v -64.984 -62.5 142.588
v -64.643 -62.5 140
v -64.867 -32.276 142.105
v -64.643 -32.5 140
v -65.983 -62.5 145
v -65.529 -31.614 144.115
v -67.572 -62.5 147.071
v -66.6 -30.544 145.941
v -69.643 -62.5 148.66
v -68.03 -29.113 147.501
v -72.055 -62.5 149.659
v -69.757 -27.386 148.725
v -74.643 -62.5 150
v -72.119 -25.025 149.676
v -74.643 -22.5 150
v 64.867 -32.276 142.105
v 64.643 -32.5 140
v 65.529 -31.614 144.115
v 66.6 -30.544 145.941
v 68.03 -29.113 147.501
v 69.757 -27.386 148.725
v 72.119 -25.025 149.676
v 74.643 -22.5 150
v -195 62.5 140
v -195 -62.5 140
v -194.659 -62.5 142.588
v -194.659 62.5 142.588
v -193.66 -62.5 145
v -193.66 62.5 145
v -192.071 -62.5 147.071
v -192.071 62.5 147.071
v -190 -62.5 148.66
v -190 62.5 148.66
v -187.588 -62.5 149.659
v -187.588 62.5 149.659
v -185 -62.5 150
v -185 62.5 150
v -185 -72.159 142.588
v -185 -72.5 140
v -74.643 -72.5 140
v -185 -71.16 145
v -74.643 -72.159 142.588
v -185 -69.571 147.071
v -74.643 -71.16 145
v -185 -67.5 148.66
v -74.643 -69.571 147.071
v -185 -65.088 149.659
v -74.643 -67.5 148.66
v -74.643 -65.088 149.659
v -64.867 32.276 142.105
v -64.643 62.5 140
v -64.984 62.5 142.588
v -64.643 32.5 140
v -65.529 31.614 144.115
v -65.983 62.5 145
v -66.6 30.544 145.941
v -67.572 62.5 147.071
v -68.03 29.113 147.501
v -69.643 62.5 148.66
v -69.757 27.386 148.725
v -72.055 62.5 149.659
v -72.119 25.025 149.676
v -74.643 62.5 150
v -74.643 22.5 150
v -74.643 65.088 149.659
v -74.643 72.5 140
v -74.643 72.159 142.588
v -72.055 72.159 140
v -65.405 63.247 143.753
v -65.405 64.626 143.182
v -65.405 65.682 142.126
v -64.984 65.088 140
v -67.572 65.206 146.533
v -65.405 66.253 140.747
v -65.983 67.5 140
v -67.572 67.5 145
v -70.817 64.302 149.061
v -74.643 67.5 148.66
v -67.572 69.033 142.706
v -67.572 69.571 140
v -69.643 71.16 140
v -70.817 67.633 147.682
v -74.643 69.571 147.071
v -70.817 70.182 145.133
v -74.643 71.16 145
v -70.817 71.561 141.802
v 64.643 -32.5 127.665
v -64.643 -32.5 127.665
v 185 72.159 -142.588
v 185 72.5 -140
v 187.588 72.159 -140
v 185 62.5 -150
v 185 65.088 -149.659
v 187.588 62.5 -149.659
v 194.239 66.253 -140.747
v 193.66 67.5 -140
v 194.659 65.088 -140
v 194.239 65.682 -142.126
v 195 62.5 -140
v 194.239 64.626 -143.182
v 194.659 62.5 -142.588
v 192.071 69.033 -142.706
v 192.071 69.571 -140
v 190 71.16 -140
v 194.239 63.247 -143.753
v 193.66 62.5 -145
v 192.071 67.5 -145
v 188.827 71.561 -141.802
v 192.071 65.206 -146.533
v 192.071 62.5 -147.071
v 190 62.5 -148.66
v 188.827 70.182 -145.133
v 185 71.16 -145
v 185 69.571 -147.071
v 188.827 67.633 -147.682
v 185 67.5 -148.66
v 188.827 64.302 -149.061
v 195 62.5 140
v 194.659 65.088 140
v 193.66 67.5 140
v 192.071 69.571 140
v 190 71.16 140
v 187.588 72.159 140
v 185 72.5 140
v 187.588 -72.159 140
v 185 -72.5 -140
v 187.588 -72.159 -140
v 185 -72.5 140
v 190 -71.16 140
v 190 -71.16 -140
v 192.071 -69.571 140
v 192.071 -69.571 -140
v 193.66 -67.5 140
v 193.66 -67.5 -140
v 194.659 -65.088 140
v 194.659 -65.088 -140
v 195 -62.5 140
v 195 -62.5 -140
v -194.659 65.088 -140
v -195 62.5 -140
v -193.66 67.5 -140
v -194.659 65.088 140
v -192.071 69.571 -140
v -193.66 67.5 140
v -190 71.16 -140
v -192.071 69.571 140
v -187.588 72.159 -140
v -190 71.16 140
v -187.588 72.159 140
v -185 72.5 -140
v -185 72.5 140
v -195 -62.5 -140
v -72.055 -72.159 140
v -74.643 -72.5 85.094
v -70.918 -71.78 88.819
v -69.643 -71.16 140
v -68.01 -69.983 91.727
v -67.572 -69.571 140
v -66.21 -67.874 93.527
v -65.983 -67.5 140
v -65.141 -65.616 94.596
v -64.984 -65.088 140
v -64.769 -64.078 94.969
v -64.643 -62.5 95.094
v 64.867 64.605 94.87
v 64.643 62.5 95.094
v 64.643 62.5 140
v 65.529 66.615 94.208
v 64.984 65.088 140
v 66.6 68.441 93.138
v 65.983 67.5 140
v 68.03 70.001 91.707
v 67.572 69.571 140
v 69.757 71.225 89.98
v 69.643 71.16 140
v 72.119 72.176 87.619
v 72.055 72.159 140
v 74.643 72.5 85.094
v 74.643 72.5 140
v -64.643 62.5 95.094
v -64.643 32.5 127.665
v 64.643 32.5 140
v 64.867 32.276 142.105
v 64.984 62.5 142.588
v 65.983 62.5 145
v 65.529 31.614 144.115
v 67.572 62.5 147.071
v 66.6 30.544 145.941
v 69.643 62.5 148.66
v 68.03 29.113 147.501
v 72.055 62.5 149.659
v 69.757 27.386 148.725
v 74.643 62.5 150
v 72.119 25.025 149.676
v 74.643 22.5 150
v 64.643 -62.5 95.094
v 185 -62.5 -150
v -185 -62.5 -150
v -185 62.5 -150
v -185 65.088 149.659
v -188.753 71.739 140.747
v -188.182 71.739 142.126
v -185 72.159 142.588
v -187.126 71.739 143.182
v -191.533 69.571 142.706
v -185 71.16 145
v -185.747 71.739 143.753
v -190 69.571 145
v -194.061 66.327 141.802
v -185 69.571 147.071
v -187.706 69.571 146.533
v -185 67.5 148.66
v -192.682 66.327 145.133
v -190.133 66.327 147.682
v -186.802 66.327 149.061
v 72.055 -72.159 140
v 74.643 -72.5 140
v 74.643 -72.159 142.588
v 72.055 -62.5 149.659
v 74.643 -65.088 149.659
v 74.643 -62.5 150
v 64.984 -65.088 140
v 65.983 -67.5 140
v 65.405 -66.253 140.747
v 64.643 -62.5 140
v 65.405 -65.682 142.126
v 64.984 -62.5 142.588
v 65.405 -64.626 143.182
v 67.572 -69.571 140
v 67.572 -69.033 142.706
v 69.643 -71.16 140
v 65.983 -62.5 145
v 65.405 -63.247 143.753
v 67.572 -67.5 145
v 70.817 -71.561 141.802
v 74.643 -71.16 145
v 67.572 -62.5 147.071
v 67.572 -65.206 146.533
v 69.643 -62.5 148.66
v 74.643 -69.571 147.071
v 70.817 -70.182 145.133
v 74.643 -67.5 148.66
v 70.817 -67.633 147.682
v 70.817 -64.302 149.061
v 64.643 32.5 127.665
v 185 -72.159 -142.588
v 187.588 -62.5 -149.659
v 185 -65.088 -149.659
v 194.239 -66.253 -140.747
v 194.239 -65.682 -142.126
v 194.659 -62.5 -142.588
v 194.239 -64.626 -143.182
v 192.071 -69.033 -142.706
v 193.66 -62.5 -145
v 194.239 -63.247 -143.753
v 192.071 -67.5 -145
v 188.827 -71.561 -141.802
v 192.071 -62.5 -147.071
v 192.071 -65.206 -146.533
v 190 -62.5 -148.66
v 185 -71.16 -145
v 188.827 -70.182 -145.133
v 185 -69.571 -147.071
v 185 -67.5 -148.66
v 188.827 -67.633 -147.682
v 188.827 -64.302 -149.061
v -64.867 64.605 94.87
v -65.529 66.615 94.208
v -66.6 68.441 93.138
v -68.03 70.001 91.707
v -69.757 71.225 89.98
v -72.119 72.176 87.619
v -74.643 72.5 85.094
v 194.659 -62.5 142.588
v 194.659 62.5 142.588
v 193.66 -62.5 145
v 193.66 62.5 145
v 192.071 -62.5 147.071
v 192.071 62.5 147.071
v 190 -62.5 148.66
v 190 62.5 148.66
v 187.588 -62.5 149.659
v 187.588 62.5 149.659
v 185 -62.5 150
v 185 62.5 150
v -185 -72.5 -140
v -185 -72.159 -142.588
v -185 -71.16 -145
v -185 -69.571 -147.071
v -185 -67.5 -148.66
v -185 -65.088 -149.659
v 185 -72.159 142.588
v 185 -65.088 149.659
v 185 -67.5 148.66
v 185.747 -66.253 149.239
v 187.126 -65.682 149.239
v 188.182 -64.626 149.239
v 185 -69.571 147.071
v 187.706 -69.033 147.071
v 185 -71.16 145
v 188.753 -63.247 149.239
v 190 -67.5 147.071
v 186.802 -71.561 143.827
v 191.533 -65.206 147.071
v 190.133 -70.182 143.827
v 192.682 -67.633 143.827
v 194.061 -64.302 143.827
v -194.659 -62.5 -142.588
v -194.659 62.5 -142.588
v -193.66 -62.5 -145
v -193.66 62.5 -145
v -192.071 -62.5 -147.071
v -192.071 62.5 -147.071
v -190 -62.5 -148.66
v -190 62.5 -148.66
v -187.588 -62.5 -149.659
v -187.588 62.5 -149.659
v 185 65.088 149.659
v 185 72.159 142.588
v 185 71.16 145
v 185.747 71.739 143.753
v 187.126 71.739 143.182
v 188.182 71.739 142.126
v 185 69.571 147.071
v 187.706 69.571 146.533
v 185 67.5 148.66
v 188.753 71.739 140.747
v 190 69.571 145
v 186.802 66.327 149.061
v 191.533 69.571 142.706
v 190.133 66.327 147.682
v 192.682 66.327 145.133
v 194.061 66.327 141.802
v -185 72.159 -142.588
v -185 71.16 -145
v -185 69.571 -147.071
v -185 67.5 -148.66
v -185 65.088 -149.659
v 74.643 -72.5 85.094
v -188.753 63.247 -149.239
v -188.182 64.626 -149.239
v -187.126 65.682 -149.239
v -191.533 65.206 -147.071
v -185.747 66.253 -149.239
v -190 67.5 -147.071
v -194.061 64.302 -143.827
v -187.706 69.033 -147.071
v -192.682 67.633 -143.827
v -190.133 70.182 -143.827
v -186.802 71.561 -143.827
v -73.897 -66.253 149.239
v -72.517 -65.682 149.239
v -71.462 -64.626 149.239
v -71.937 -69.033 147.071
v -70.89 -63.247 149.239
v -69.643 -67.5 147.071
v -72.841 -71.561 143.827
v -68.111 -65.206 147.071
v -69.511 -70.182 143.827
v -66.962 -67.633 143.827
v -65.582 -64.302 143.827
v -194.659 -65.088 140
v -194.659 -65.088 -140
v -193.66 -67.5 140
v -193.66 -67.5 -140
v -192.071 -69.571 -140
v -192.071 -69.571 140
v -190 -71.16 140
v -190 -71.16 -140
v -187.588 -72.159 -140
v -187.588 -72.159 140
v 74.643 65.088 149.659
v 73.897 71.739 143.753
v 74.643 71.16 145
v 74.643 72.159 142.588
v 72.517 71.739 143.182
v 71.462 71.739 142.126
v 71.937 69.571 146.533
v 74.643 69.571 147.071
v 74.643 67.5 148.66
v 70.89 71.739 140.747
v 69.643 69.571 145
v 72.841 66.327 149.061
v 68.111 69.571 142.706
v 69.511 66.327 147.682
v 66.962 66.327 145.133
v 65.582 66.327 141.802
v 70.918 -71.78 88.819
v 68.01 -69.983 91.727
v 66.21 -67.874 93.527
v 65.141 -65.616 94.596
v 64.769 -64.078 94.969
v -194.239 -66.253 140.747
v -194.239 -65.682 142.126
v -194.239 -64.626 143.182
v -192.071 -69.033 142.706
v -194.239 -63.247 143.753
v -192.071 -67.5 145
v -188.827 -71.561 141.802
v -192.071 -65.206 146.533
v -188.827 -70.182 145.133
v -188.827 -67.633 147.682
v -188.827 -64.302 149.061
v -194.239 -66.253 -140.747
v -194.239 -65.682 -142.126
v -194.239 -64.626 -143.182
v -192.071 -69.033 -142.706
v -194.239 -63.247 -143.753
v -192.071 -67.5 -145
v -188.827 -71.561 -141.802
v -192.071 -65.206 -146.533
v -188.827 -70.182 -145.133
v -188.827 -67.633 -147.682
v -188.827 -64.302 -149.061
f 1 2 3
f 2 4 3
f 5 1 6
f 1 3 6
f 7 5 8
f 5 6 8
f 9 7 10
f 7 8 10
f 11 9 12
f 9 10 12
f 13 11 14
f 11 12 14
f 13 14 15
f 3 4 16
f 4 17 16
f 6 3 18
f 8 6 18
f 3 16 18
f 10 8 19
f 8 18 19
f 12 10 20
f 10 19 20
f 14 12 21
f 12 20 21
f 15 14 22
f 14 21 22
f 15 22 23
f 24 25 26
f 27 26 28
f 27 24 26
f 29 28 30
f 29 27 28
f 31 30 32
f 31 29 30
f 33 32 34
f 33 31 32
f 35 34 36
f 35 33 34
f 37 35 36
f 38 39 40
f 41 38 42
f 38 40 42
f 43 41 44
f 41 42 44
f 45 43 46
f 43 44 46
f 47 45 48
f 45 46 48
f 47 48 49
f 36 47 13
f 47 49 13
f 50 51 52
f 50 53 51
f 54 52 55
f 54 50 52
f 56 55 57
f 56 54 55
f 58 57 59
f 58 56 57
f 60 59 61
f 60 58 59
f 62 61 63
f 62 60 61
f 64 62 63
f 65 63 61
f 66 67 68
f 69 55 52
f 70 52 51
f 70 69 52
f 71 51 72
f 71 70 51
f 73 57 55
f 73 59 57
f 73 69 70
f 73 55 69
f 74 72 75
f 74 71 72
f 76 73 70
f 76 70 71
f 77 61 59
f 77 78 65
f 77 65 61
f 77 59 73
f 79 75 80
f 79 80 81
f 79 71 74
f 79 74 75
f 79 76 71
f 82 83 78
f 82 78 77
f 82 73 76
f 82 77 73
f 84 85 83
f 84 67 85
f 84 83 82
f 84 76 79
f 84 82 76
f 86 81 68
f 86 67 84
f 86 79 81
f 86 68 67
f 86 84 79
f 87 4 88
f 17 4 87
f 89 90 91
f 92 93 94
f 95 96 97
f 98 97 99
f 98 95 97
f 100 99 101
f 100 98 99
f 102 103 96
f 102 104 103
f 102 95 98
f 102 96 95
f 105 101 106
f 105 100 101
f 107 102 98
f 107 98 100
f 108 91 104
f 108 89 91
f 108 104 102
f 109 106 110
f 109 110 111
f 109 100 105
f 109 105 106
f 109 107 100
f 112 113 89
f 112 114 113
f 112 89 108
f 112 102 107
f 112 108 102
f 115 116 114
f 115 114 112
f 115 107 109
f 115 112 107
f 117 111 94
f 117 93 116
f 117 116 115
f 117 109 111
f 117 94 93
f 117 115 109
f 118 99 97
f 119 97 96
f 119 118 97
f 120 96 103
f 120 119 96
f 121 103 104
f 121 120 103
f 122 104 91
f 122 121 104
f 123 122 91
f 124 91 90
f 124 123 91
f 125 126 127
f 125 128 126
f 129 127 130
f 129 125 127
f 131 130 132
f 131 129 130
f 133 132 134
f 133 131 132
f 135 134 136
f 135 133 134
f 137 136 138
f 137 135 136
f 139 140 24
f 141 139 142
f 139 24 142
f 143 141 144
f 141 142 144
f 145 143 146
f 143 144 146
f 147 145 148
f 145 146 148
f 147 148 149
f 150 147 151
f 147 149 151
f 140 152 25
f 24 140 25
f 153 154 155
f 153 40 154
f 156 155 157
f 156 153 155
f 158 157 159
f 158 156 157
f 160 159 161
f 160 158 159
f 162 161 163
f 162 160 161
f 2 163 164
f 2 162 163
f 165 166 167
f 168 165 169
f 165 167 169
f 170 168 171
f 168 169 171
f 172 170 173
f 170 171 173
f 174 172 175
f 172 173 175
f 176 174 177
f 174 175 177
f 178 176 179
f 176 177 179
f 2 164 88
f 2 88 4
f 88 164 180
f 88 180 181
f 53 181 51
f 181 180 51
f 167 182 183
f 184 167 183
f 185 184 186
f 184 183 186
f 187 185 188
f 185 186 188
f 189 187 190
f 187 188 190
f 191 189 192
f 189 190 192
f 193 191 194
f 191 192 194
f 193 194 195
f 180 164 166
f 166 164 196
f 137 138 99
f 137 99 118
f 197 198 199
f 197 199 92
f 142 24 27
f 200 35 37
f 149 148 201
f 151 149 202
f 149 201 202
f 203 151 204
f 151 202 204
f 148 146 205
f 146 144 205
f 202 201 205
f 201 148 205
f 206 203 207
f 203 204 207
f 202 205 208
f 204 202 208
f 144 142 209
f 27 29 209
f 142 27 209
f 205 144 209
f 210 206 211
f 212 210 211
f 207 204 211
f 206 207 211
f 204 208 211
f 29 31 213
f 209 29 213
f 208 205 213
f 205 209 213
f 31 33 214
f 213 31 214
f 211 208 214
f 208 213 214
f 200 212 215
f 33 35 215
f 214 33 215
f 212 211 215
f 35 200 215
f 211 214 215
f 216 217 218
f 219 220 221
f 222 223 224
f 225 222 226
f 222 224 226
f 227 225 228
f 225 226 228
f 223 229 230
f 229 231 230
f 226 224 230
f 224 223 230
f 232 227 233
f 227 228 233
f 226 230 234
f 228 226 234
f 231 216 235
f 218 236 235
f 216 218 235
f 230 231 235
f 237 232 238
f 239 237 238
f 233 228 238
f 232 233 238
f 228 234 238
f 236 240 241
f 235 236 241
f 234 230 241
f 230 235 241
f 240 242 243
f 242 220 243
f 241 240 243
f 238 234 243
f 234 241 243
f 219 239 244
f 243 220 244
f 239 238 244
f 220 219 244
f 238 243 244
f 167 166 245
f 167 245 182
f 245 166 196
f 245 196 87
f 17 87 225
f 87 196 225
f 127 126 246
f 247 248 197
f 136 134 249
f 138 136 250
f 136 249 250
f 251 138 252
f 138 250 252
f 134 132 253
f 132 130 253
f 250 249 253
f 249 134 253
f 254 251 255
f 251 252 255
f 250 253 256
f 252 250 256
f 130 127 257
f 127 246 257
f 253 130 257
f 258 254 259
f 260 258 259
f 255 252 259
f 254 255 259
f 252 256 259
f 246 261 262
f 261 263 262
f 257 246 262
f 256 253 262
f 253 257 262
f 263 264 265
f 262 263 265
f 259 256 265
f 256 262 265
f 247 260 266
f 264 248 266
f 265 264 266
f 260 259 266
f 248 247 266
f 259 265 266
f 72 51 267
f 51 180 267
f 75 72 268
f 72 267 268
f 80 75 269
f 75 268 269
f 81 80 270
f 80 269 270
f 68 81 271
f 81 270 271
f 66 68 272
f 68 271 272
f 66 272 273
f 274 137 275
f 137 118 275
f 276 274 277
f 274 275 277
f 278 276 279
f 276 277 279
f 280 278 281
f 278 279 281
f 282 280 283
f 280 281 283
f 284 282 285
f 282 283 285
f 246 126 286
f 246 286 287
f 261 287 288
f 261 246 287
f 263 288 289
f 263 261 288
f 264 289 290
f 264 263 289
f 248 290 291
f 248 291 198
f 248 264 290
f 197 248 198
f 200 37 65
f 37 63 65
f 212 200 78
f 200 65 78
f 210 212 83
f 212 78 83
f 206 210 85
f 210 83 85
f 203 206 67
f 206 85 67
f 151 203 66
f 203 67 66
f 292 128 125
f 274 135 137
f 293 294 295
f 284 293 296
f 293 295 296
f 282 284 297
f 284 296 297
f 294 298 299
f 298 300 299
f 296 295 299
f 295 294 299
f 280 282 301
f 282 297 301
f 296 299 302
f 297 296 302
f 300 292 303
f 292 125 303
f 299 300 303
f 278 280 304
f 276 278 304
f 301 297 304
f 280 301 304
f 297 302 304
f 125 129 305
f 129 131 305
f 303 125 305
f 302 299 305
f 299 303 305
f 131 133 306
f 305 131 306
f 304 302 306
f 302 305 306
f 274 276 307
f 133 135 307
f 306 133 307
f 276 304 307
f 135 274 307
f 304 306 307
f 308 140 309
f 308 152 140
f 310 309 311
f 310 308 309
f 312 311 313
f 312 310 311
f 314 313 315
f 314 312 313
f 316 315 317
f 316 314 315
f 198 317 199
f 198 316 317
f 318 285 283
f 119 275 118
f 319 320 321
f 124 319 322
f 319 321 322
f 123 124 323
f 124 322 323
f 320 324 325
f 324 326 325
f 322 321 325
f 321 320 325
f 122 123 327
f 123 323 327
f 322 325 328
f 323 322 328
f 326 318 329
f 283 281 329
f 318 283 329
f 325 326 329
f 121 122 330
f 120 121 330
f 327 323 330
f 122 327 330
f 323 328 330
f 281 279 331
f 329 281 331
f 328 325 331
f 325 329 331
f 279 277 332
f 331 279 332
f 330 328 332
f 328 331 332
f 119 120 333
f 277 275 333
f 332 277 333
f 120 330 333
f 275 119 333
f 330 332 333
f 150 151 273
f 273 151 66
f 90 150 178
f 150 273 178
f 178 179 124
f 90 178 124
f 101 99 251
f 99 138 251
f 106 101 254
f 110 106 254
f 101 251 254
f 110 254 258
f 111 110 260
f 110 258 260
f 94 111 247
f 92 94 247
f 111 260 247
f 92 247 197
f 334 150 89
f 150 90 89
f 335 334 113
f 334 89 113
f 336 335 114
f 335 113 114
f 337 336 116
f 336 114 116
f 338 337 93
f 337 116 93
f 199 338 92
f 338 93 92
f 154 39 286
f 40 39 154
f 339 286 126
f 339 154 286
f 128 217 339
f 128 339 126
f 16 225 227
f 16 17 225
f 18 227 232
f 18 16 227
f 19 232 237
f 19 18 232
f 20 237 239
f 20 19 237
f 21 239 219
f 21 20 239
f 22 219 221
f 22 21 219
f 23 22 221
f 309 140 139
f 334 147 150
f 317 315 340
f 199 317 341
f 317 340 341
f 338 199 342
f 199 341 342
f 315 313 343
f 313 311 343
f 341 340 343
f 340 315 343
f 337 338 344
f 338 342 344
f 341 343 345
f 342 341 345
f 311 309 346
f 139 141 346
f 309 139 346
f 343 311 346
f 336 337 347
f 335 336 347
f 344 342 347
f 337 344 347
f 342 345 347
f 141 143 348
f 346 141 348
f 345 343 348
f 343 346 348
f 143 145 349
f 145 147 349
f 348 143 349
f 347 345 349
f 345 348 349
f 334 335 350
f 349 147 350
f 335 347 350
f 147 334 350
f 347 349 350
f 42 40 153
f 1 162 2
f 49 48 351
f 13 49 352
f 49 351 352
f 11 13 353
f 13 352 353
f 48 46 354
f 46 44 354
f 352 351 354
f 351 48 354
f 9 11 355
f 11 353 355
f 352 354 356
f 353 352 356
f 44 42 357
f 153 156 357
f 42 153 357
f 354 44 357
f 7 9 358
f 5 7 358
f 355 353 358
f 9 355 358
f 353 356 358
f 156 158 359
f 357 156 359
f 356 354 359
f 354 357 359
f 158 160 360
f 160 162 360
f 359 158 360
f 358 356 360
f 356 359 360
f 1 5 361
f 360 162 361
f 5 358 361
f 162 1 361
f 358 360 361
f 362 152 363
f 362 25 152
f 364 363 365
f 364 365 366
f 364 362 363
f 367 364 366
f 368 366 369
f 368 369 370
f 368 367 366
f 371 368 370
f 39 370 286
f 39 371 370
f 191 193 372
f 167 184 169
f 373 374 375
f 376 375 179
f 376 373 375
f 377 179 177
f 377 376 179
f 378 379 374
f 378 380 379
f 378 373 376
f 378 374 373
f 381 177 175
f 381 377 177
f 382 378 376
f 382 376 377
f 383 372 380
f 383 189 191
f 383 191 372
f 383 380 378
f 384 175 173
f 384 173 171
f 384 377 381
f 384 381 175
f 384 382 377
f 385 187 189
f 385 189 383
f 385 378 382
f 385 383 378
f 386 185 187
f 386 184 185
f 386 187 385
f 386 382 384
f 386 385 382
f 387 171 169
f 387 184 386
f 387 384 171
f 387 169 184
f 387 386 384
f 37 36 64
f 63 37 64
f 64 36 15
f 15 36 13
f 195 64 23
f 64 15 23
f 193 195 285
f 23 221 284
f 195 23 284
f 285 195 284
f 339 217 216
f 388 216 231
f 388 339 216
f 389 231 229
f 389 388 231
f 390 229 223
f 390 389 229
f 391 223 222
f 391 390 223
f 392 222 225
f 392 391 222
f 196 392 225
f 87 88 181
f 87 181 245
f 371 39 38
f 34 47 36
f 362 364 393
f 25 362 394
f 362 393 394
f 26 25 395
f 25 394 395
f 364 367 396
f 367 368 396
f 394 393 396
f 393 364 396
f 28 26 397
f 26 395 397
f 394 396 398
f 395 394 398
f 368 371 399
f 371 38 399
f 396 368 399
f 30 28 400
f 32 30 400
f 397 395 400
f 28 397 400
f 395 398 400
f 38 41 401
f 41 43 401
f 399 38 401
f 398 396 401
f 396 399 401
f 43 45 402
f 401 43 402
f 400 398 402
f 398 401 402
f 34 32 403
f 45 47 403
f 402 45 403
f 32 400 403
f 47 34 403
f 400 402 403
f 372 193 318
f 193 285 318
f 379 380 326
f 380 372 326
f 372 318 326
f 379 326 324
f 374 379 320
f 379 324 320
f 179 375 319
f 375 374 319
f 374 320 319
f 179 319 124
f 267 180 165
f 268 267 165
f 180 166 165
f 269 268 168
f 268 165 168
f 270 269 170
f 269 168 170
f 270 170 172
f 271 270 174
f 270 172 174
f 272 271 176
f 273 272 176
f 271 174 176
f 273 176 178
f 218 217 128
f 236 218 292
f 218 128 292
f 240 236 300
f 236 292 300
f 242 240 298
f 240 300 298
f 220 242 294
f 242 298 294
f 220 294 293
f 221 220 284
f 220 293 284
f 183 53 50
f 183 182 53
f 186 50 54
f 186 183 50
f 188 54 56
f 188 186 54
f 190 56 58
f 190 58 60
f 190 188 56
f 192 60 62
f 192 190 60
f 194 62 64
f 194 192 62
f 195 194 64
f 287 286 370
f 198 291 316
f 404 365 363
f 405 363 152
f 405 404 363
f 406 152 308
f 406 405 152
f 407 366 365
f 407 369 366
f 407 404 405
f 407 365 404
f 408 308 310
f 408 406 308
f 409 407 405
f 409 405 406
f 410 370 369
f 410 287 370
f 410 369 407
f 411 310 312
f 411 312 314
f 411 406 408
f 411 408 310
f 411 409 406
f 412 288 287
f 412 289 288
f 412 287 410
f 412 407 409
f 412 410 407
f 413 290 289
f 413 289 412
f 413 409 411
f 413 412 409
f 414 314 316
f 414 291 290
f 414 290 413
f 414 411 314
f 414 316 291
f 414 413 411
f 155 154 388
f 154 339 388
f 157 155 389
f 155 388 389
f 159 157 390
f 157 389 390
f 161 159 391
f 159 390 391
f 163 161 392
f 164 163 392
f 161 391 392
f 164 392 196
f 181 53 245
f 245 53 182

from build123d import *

# Parameters (mm, degrees)
F0_W     = 390
F0_H     = 300
F0_W_2   = 129.2868405581
F0_H_2   = 32.5715690851
F1_DEPTH = 72.5
F2_W     = 129.2868405581
F2_H     = 22.3345696926
F3_DEPTH = 40
F4_R     = 10


# Not quite as in the source:
# - a pattern or mirror of a feature is missing from the dataset's text; its kind, count and spacing are read off the source's solid


with BuildPart() as f1:
    # F0 (on Front) → F1 (new body, symmetric)
    with BuildSketch(Plane.XZ):
        Rectangle(F0_W, F0_H)
        with Locations((0, 111.3796457648)):
            Rectangle(F0_W_2, F0_H_2, mode=Mode.SUBTRACT)
    extrude(amount=F1_DEPTH, both=True)

    # F2 (on face) → F3 (cut)
    with BuildSketch(Plane.XZ.offset(72.5)):
        with Locations((0, 138.8327151537)):
            Rectangle(F2_W, F2_H)
    f3 = extrude(amount=-F3_DEPTH, mode=Mode.SUBTRACT)

    # F3_copies: F3 across plane
    add(f3.mirror(Plane.ZX), mode=Mode.SUBTRACT)

    # F4
    f4_edges = [f1.edges().sort_by_distance(p)[0] for p in [
        (0, -72.5, -150),
        (195, -72.5, 0),
        (129.82171, -72.5, 150),
        (64.64342, -72.5, 122.546931),
        (0, -72.5, 95.093861),
        (-64.64342, -72.5, 122.546931),
        (-129.82171, -72.5, 150),
        (-195, -72.5, 0),
        (-195, 0, 150),
        (-195, 72.5, 0),
        (-195, 0, -150),
        (195, 0, 150),
        (64.64342, -52.5, 150),
        (0, -32.5, 150),
        (-64.64342, -52.5, 150),
        (-129.82171, 72.5, 150),
        (-64.64342, 52.5, 150),
        (0, 32.5, 150),
        (64.64342, 52.5, 150),
        (129.82171, 72.5, 150),
        (0, 72.5, -150),
        (195, 72.5, 0),
        (64.64342, 72.5, 122.546931),
        (0, 72.5, 95.093861),
        (-64.64342, 72.5, 122.546931),
        (195, 0, -150),
    ]]
    fillet(f4_edges, radius=F4_R)


solid = f1.part
